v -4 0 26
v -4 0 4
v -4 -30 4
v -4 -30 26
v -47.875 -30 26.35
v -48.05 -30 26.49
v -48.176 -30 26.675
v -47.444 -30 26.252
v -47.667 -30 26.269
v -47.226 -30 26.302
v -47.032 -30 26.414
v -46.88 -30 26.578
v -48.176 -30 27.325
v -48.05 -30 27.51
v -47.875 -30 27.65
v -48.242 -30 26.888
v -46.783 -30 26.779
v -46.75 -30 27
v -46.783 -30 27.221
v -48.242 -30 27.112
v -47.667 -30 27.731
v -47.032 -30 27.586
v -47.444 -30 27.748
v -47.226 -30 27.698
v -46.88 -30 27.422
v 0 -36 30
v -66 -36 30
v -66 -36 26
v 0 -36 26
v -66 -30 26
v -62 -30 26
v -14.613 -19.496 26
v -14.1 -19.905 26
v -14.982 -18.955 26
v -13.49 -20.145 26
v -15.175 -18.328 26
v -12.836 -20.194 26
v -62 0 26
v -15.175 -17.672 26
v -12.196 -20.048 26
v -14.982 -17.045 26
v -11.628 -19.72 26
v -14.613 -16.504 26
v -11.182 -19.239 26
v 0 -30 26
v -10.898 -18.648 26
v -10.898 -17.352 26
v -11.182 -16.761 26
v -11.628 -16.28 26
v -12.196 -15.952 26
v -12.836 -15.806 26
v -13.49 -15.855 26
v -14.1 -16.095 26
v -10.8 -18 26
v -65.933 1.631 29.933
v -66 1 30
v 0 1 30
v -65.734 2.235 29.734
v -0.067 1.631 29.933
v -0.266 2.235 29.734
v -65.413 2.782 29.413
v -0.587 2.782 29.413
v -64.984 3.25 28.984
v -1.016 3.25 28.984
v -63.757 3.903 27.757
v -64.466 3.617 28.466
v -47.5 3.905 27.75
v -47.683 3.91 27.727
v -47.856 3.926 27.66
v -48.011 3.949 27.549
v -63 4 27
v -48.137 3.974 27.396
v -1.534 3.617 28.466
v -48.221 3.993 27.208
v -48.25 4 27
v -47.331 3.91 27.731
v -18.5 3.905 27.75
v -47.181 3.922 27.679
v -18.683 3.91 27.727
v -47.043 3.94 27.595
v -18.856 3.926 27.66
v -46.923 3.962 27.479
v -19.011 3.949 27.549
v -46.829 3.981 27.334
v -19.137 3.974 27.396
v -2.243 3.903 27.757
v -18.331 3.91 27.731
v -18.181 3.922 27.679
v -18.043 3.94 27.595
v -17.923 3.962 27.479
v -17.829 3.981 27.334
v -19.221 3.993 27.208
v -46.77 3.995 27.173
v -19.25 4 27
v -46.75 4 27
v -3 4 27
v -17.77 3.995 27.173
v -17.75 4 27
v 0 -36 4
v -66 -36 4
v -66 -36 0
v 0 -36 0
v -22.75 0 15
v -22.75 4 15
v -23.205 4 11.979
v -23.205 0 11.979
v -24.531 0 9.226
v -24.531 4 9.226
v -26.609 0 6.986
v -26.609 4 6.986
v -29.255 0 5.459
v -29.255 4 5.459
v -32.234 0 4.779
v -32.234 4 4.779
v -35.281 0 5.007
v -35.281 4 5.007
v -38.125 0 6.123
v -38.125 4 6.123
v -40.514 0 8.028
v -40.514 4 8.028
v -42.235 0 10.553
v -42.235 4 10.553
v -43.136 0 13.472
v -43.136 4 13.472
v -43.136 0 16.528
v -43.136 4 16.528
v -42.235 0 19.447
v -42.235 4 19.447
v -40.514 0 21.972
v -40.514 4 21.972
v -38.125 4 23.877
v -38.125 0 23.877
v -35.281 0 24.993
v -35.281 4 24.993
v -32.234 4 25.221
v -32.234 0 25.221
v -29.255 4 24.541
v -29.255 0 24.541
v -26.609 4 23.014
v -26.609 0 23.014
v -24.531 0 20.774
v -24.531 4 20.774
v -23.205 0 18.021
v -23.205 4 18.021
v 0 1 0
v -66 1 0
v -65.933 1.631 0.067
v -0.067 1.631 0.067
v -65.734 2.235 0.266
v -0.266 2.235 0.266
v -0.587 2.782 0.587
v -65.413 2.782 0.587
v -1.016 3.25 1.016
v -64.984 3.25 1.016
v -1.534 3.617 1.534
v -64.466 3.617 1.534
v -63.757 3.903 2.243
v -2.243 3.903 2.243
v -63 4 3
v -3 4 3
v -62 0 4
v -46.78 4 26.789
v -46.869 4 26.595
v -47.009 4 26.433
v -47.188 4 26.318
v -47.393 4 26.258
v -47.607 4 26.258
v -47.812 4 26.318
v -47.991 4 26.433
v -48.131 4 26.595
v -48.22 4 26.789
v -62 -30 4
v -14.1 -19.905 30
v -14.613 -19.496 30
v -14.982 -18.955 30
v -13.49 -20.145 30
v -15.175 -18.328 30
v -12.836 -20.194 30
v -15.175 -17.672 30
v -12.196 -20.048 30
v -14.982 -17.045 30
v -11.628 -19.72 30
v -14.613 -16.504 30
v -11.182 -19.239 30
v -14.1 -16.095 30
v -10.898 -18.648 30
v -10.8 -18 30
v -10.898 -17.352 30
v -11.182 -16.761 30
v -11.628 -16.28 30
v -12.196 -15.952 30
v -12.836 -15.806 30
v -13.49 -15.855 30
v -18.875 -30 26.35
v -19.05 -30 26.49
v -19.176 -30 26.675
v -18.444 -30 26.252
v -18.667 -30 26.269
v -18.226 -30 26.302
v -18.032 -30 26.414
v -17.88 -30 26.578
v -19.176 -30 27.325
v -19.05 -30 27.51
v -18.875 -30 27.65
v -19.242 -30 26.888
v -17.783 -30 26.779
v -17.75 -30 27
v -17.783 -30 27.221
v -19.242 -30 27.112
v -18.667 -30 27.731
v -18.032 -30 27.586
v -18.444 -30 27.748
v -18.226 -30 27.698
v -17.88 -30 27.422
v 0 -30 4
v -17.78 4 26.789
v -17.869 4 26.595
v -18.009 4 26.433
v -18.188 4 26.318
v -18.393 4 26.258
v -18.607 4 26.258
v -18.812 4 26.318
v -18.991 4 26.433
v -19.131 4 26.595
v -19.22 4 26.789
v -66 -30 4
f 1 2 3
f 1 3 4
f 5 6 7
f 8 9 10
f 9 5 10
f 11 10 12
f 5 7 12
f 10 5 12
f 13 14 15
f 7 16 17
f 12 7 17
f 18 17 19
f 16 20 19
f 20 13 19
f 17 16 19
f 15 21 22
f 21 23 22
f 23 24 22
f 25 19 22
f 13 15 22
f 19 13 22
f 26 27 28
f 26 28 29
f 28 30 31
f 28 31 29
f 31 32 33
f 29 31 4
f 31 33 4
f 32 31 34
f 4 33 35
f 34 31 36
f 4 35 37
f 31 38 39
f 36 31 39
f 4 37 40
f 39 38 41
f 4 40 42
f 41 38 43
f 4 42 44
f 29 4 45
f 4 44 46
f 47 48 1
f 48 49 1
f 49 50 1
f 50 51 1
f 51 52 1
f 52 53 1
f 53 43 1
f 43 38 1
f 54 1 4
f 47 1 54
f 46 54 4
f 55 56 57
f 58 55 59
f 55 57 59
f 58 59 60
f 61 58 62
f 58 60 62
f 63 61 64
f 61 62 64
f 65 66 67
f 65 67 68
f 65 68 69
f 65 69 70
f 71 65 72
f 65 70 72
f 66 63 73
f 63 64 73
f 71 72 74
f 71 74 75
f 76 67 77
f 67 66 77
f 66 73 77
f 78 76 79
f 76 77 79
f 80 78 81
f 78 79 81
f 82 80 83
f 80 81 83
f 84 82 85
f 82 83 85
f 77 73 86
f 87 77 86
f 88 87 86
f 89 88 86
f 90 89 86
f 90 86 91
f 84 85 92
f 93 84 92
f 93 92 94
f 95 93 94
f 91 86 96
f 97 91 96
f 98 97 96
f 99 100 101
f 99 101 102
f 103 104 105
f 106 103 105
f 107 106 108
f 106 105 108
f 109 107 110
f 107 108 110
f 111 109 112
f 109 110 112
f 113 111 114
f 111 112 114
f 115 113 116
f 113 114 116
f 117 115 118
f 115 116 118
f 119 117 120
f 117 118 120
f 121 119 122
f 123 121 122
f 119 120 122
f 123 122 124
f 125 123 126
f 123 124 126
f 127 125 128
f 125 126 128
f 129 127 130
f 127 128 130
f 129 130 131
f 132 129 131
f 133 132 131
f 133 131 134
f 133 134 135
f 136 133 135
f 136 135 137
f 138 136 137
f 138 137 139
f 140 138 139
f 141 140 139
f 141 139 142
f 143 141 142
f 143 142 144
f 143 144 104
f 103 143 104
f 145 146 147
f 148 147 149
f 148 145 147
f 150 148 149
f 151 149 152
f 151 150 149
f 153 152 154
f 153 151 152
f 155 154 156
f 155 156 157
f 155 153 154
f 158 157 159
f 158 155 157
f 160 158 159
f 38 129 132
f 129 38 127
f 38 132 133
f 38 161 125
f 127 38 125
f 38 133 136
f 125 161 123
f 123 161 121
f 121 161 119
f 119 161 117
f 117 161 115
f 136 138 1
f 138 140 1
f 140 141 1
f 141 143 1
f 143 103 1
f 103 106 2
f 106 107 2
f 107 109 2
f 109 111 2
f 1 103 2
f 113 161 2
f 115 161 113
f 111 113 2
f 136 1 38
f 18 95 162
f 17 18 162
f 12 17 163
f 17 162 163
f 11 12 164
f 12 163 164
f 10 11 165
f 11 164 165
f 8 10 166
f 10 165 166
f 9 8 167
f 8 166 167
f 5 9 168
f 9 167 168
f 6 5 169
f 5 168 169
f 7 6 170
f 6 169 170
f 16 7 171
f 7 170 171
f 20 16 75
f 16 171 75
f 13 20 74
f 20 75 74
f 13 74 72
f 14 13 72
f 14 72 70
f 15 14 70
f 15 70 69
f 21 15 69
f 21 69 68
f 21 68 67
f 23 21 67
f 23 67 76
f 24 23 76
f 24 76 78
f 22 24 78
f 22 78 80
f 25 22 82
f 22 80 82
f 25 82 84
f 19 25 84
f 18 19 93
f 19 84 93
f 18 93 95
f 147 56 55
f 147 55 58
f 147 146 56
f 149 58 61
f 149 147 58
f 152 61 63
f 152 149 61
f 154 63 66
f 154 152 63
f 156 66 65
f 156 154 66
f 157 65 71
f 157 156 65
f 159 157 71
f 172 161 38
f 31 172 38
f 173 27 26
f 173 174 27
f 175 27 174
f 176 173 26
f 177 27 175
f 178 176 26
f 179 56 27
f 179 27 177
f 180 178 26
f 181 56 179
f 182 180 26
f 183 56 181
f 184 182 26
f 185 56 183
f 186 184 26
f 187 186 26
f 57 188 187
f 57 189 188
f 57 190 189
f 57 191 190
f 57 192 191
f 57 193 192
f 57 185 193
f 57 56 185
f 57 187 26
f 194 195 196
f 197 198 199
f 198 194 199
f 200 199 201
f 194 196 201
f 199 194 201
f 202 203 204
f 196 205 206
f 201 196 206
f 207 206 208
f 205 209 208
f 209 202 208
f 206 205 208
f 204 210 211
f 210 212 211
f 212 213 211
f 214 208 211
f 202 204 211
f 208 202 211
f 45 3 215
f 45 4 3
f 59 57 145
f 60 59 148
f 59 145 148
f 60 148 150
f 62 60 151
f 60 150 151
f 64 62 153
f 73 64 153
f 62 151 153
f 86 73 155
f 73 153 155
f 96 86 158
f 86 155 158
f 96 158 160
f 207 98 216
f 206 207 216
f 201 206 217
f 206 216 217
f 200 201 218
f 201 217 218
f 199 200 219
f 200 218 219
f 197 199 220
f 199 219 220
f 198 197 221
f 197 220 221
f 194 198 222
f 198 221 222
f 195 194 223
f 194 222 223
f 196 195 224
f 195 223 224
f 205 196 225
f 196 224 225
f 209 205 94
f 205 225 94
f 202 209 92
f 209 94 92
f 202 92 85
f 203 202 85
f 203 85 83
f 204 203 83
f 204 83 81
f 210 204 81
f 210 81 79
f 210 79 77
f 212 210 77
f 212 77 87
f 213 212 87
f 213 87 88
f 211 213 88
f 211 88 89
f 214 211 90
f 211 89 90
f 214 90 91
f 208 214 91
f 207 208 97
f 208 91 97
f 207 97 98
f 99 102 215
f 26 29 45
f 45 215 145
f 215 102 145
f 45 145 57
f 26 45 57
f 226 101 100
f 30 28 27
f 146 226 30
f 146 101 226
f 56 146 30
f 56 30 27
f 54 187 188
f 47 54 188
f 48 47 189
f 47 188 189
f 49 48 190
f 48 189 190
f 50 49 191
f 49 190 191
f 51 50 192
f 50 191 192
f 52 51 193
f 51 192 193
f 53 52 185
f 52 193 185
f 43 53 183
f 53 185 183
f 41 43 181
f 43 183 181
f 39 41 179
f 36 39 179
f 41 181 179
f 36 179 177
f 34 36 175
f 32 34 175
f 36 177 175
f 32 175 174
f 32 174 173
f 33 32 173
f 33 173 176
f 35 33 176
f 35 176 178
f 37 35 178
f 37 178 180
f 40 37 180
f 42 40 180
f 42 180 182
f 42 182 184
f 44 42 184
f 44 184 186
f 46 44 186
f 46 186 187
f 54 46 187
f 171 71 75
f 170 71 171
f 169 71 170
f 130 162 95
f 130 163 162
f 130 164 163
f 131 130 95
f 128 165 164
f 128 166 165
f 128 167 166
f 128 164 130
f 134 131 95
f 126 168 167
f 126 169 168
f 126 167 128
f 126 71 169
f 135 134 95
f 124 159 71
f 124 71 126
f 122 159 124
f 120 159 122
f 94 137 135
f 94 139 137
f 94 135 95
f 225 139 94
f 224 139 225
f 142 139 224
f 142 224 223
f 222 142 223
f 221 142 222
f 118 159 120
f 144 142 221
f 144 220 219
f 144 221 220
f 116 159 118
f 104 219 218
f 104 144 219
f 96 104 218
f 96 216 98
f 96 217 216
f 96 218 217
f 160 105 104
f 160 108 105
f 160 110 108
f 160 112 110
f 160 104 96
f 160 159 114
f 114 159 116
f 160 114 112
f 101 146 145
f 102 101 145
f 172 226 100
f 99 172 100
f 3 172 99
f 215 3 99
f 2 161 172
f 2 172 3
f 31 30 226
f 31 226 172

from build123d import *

# Parameters (mm, degrees)
SKETCH1_W           = 66
SKETCH1_H           = 30
BOSS_EXTRUDE1_DEPTH = 4
FILLET1_R           = 3
SKETCH2_W           = 66
SKETCH2_H           = 30
SKETCH2_W_2         = 58
SKETCH2_H_2         = 22
BOSS_EXTRUDE2_DEPTH = 30
SKETCH3_R           = 10.25
CUT_EXTRUDE1_DEPTH  = 35
SKETCH4_R           = 0.75
CUT_EXTRUDE2_DEPTH  = 35
SKETCH5_W           = 66
SKETCH5_H           = 4
BOSS_EXTRUDE4_DEPTH = 6
SKETCH6_R           = 2.2
CUT_EXTRUDE3_DEPTH  = 6


with BuildPart() as part:
    # Sketch1 → Boss-Extrude1 (new body)
    with BuildSketch(Plane(origin=(0, 0, 0), x_dir=(1, 0, 0), z_dir=(0, 1, 0))):
        with Locations((-33, -15)):
            Rectangle(SKETCH1_W, SKETCH1_H)
    extrude(amount=BOSS_EXTRUDE1_DEPTH)

    # Fillet1
    fillet1_edges = [part.edges().sort_by_distance(p)[0] for p in [
        (-66, 4, 15),
        (-33, 4, 30),
        (0, 4, 15),
        (-33, 4, 0),
    ]]
    fillet(fillet1_edges, radius=FILLET1_R)

    # Sketch2 → Boss-Extrude2 (add)
    with BuildSketch(Plane.XZ):
        with Locations((-33, 15)):
            Rectangle(SKETCH2_W, SKETCH2_H)
        with Locations((-33, 15)):
            Rectangle(SKETCH2_W_2, SKETCH2_H_2, mode=Mode.SUBTRACT)
    extrude(amount=BOSS_EXTRUDE2_DEPTH)

    # Sketch3 → Cut-Extrude1 (cut, through all)
    with BuildSketch(Plane(origin=(0, 4, 0), x_dir=(1, 0, 0), z_dir=(0, 1, 0))):
        with Locations((-33, -15)):
            Circle(SKETCH3_R)
    extrude(amount=-CUT_EXTRUDE1_DEPTH, mode=Mode.SUBTRACT)

    # Sketch4 → Cut-Extrude2 (cut, through all)
    with BuildSketch(Plane(origin=(0, 4, 0), x_dir=(1, 0, 0), z_dir=(0, 1, 0))):
        with Locations((-47.5, -27)):
            Circle(SKETCH4_R)
        with Locations((-18.5, -27)):
            Circle(SKETCH4_R)
    extrude(amount=-CUT_EXTRUDE2_DEPTH, mode=Mode.SUBTRACT)

    # Sketch5 → Boss-Extrude4 (add)
    with BuildSketch(Plane.XZ.offset(30)):
        with Locations((-33, 28)):
            Rectangle(SKETCH5_W, SKETCH5_H)
        with Locations((-33, 2)):
            Rectangle(SKETCH5_W, SKETCH5_H)
    extrude(amount=BOSS_EXTRUDE4_DEPTH)

    # Sketch6 → Cut-Extrude3 (cut)
    with BuildSketch(Plane.XY.offset(30)):
        with Locations((-13, -18)):
            Circle(SKETCH6_R)
    extrude(amount=-CUT_EXTRUDE3_DEPTH, mode=Mode.SUBTRACT)


solid = part.part
